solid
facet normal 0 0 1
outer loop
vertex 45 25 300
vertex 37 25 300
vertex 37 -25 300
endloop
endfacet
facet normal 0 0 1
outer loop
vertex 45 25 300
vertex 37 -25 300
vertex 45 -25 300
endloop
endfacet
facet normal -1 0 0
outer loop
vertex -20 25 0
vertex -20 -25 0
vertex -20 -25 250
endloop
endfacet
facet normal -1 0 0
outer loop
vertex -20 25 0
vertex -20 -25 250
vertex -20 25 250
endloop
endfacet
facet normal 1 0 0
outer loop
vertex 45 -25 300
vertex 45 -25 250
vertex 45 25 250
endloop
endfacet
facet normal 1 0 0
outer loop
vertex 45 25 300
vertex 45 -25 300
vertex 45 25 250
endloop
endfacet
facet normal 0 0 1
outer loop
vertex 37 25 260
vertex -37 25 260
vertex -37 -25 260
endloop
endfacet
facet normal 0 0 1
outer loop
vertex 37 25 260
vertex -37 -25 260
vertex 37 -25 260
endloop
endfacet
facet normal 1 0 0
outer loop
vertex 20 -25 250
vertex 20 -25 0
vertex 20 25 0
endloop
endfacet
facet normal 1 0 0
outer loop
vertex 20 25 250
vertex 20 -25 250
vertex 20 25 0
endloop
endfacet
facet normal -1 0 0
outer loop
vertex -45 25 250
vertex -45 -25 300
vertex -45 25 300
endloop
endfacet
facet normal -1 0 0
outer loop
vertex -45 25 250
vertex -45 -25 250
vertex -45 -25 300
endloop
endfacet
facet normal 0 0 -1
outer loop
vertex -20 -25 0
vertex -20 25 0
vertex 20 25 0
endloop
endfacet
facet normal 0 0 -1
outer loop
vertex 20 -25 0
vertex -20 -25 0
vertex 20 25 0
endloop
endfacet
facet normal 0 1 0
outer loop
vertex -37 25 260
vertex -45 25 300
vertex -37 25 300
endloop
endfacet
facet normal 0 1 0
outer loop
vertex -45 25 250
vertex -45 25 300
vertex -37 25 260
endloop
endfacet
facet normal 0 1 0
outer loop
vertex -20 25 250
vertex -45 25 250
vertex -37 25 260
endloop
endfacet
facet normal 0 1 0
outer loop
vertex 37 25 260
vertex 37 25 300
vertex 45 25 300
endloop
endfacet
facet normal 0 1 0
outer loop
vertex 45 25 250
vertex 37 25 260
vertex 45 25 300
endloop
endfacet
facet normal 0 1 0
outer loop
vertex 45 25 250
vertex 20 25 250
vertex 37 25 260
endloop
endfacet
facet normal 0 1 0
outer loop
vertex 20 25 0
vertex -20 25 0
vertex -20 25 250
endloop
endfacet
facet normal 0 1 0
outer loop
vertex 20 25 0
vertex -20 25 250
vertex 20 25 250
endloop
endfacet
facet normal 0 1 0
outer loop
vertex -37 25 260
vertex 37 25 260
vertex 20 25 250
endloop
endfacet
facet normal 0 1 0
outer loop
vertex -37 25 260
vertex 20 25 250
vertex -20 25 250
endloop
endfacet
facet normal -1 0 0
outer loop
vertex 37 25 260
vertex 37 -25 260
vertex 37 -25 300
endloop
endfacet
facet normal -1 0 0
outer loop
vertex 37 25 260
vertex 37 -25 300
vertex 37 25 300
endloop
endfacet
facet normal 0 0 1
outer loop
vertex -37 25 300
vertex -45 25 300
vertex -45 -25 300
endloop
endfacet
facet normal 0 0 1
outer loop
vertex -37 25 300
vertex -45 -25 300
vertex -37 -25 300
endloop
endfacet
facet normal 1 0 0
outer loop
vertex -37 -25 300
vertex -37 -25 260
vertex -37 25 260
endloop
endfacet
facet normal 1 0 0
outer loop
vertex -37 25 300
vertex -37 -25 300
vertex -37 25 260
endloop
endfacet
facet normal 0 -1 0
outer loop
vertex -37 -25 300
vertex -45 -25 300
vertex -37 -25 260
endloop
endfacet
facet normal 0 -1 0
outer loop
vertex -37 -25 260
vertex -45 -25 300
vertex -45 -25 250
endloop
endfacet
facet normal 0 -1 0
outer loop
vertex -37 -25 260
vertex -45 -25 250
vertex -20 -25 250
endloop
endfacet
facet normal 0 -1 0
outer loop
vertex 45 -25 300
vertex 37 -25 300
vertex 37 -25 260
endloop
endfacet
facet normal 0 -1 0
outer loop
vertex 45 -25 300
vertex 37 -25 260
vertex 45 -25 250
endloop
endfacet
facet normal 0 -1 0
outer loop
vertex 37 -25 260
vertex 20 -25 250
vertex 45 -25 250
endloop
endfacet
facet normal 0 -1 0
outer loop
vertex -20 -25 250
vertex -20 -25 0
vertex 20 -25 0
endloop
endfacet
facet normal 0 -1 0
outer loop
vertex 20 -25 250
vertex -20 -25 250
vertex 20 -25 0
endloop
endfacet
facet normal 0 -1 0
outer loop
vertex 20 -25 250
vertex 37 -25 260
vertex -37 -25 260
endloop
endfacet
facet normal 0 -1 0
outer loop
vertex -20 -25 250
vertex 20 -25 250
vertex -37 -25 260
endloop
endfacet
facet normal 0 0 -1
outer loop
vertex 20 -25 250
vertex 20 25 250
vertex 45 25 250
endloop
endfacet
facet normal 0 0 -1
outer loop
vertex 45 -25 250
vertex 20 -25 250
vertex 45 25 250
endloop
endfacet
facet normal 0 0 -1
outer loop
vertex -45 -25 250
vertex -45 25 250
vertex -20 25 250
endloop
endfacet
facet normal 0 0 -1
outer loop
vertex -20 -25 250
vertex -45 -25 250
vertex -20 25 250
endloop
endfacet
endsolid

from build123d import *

# Parameters (mm, degrees)
SZKIC1_W                    = 40
SZKIC1_H                    = 50
DODANIE_WYCI_GNI_CIE1_DEPTH = 250
SZKIC2_W                    = 90
SZKIC2_H                    = 50
DODANIE_WYCI_GNI_CIE2_DEPTH = 10
SZKIC3_W                    = 8
SZKIC3_H                    = 50
DODANIE_WYCI_GNI_CIE3_DEPTH = 40


with BuildPart() as part:
    # Szkic1 → Dodanie-wyciągnięcie1 (new body)
    with BuildSketch(Plane.XY):
        Rectangle(SZKIC1_W, SZKIC1_H)
    extrude(amount=DODANIE_WYCI_GNI_CIE1_DEPTH)

    # Szkic2 → Dodanie-wyciągnięcie2 (add)
    with BuildSketch(Plane.XY.offset(250)):
        Rectangle(SZKIC2_W, SZKIC2_H)
    extrude(amount=DODANIE_WYCI_GNI_CIE2_DEPTH)

    # Szkic3 → Dodanie-wyciągnięcie3 (add)
    with BuildSketch(Plane.XY.offset(260)):
        with Locations((-41, 0)):
            Rectangle(SZKIC3_W, SZKIC3_H)
        with Locations((41, 0)):
            Rectangle(SZKIC3_W, SZKIC3_H)
    extrude(amount=DODANIE_WYCI_GNI_CIE3_DEPTH)


solid = part.part
